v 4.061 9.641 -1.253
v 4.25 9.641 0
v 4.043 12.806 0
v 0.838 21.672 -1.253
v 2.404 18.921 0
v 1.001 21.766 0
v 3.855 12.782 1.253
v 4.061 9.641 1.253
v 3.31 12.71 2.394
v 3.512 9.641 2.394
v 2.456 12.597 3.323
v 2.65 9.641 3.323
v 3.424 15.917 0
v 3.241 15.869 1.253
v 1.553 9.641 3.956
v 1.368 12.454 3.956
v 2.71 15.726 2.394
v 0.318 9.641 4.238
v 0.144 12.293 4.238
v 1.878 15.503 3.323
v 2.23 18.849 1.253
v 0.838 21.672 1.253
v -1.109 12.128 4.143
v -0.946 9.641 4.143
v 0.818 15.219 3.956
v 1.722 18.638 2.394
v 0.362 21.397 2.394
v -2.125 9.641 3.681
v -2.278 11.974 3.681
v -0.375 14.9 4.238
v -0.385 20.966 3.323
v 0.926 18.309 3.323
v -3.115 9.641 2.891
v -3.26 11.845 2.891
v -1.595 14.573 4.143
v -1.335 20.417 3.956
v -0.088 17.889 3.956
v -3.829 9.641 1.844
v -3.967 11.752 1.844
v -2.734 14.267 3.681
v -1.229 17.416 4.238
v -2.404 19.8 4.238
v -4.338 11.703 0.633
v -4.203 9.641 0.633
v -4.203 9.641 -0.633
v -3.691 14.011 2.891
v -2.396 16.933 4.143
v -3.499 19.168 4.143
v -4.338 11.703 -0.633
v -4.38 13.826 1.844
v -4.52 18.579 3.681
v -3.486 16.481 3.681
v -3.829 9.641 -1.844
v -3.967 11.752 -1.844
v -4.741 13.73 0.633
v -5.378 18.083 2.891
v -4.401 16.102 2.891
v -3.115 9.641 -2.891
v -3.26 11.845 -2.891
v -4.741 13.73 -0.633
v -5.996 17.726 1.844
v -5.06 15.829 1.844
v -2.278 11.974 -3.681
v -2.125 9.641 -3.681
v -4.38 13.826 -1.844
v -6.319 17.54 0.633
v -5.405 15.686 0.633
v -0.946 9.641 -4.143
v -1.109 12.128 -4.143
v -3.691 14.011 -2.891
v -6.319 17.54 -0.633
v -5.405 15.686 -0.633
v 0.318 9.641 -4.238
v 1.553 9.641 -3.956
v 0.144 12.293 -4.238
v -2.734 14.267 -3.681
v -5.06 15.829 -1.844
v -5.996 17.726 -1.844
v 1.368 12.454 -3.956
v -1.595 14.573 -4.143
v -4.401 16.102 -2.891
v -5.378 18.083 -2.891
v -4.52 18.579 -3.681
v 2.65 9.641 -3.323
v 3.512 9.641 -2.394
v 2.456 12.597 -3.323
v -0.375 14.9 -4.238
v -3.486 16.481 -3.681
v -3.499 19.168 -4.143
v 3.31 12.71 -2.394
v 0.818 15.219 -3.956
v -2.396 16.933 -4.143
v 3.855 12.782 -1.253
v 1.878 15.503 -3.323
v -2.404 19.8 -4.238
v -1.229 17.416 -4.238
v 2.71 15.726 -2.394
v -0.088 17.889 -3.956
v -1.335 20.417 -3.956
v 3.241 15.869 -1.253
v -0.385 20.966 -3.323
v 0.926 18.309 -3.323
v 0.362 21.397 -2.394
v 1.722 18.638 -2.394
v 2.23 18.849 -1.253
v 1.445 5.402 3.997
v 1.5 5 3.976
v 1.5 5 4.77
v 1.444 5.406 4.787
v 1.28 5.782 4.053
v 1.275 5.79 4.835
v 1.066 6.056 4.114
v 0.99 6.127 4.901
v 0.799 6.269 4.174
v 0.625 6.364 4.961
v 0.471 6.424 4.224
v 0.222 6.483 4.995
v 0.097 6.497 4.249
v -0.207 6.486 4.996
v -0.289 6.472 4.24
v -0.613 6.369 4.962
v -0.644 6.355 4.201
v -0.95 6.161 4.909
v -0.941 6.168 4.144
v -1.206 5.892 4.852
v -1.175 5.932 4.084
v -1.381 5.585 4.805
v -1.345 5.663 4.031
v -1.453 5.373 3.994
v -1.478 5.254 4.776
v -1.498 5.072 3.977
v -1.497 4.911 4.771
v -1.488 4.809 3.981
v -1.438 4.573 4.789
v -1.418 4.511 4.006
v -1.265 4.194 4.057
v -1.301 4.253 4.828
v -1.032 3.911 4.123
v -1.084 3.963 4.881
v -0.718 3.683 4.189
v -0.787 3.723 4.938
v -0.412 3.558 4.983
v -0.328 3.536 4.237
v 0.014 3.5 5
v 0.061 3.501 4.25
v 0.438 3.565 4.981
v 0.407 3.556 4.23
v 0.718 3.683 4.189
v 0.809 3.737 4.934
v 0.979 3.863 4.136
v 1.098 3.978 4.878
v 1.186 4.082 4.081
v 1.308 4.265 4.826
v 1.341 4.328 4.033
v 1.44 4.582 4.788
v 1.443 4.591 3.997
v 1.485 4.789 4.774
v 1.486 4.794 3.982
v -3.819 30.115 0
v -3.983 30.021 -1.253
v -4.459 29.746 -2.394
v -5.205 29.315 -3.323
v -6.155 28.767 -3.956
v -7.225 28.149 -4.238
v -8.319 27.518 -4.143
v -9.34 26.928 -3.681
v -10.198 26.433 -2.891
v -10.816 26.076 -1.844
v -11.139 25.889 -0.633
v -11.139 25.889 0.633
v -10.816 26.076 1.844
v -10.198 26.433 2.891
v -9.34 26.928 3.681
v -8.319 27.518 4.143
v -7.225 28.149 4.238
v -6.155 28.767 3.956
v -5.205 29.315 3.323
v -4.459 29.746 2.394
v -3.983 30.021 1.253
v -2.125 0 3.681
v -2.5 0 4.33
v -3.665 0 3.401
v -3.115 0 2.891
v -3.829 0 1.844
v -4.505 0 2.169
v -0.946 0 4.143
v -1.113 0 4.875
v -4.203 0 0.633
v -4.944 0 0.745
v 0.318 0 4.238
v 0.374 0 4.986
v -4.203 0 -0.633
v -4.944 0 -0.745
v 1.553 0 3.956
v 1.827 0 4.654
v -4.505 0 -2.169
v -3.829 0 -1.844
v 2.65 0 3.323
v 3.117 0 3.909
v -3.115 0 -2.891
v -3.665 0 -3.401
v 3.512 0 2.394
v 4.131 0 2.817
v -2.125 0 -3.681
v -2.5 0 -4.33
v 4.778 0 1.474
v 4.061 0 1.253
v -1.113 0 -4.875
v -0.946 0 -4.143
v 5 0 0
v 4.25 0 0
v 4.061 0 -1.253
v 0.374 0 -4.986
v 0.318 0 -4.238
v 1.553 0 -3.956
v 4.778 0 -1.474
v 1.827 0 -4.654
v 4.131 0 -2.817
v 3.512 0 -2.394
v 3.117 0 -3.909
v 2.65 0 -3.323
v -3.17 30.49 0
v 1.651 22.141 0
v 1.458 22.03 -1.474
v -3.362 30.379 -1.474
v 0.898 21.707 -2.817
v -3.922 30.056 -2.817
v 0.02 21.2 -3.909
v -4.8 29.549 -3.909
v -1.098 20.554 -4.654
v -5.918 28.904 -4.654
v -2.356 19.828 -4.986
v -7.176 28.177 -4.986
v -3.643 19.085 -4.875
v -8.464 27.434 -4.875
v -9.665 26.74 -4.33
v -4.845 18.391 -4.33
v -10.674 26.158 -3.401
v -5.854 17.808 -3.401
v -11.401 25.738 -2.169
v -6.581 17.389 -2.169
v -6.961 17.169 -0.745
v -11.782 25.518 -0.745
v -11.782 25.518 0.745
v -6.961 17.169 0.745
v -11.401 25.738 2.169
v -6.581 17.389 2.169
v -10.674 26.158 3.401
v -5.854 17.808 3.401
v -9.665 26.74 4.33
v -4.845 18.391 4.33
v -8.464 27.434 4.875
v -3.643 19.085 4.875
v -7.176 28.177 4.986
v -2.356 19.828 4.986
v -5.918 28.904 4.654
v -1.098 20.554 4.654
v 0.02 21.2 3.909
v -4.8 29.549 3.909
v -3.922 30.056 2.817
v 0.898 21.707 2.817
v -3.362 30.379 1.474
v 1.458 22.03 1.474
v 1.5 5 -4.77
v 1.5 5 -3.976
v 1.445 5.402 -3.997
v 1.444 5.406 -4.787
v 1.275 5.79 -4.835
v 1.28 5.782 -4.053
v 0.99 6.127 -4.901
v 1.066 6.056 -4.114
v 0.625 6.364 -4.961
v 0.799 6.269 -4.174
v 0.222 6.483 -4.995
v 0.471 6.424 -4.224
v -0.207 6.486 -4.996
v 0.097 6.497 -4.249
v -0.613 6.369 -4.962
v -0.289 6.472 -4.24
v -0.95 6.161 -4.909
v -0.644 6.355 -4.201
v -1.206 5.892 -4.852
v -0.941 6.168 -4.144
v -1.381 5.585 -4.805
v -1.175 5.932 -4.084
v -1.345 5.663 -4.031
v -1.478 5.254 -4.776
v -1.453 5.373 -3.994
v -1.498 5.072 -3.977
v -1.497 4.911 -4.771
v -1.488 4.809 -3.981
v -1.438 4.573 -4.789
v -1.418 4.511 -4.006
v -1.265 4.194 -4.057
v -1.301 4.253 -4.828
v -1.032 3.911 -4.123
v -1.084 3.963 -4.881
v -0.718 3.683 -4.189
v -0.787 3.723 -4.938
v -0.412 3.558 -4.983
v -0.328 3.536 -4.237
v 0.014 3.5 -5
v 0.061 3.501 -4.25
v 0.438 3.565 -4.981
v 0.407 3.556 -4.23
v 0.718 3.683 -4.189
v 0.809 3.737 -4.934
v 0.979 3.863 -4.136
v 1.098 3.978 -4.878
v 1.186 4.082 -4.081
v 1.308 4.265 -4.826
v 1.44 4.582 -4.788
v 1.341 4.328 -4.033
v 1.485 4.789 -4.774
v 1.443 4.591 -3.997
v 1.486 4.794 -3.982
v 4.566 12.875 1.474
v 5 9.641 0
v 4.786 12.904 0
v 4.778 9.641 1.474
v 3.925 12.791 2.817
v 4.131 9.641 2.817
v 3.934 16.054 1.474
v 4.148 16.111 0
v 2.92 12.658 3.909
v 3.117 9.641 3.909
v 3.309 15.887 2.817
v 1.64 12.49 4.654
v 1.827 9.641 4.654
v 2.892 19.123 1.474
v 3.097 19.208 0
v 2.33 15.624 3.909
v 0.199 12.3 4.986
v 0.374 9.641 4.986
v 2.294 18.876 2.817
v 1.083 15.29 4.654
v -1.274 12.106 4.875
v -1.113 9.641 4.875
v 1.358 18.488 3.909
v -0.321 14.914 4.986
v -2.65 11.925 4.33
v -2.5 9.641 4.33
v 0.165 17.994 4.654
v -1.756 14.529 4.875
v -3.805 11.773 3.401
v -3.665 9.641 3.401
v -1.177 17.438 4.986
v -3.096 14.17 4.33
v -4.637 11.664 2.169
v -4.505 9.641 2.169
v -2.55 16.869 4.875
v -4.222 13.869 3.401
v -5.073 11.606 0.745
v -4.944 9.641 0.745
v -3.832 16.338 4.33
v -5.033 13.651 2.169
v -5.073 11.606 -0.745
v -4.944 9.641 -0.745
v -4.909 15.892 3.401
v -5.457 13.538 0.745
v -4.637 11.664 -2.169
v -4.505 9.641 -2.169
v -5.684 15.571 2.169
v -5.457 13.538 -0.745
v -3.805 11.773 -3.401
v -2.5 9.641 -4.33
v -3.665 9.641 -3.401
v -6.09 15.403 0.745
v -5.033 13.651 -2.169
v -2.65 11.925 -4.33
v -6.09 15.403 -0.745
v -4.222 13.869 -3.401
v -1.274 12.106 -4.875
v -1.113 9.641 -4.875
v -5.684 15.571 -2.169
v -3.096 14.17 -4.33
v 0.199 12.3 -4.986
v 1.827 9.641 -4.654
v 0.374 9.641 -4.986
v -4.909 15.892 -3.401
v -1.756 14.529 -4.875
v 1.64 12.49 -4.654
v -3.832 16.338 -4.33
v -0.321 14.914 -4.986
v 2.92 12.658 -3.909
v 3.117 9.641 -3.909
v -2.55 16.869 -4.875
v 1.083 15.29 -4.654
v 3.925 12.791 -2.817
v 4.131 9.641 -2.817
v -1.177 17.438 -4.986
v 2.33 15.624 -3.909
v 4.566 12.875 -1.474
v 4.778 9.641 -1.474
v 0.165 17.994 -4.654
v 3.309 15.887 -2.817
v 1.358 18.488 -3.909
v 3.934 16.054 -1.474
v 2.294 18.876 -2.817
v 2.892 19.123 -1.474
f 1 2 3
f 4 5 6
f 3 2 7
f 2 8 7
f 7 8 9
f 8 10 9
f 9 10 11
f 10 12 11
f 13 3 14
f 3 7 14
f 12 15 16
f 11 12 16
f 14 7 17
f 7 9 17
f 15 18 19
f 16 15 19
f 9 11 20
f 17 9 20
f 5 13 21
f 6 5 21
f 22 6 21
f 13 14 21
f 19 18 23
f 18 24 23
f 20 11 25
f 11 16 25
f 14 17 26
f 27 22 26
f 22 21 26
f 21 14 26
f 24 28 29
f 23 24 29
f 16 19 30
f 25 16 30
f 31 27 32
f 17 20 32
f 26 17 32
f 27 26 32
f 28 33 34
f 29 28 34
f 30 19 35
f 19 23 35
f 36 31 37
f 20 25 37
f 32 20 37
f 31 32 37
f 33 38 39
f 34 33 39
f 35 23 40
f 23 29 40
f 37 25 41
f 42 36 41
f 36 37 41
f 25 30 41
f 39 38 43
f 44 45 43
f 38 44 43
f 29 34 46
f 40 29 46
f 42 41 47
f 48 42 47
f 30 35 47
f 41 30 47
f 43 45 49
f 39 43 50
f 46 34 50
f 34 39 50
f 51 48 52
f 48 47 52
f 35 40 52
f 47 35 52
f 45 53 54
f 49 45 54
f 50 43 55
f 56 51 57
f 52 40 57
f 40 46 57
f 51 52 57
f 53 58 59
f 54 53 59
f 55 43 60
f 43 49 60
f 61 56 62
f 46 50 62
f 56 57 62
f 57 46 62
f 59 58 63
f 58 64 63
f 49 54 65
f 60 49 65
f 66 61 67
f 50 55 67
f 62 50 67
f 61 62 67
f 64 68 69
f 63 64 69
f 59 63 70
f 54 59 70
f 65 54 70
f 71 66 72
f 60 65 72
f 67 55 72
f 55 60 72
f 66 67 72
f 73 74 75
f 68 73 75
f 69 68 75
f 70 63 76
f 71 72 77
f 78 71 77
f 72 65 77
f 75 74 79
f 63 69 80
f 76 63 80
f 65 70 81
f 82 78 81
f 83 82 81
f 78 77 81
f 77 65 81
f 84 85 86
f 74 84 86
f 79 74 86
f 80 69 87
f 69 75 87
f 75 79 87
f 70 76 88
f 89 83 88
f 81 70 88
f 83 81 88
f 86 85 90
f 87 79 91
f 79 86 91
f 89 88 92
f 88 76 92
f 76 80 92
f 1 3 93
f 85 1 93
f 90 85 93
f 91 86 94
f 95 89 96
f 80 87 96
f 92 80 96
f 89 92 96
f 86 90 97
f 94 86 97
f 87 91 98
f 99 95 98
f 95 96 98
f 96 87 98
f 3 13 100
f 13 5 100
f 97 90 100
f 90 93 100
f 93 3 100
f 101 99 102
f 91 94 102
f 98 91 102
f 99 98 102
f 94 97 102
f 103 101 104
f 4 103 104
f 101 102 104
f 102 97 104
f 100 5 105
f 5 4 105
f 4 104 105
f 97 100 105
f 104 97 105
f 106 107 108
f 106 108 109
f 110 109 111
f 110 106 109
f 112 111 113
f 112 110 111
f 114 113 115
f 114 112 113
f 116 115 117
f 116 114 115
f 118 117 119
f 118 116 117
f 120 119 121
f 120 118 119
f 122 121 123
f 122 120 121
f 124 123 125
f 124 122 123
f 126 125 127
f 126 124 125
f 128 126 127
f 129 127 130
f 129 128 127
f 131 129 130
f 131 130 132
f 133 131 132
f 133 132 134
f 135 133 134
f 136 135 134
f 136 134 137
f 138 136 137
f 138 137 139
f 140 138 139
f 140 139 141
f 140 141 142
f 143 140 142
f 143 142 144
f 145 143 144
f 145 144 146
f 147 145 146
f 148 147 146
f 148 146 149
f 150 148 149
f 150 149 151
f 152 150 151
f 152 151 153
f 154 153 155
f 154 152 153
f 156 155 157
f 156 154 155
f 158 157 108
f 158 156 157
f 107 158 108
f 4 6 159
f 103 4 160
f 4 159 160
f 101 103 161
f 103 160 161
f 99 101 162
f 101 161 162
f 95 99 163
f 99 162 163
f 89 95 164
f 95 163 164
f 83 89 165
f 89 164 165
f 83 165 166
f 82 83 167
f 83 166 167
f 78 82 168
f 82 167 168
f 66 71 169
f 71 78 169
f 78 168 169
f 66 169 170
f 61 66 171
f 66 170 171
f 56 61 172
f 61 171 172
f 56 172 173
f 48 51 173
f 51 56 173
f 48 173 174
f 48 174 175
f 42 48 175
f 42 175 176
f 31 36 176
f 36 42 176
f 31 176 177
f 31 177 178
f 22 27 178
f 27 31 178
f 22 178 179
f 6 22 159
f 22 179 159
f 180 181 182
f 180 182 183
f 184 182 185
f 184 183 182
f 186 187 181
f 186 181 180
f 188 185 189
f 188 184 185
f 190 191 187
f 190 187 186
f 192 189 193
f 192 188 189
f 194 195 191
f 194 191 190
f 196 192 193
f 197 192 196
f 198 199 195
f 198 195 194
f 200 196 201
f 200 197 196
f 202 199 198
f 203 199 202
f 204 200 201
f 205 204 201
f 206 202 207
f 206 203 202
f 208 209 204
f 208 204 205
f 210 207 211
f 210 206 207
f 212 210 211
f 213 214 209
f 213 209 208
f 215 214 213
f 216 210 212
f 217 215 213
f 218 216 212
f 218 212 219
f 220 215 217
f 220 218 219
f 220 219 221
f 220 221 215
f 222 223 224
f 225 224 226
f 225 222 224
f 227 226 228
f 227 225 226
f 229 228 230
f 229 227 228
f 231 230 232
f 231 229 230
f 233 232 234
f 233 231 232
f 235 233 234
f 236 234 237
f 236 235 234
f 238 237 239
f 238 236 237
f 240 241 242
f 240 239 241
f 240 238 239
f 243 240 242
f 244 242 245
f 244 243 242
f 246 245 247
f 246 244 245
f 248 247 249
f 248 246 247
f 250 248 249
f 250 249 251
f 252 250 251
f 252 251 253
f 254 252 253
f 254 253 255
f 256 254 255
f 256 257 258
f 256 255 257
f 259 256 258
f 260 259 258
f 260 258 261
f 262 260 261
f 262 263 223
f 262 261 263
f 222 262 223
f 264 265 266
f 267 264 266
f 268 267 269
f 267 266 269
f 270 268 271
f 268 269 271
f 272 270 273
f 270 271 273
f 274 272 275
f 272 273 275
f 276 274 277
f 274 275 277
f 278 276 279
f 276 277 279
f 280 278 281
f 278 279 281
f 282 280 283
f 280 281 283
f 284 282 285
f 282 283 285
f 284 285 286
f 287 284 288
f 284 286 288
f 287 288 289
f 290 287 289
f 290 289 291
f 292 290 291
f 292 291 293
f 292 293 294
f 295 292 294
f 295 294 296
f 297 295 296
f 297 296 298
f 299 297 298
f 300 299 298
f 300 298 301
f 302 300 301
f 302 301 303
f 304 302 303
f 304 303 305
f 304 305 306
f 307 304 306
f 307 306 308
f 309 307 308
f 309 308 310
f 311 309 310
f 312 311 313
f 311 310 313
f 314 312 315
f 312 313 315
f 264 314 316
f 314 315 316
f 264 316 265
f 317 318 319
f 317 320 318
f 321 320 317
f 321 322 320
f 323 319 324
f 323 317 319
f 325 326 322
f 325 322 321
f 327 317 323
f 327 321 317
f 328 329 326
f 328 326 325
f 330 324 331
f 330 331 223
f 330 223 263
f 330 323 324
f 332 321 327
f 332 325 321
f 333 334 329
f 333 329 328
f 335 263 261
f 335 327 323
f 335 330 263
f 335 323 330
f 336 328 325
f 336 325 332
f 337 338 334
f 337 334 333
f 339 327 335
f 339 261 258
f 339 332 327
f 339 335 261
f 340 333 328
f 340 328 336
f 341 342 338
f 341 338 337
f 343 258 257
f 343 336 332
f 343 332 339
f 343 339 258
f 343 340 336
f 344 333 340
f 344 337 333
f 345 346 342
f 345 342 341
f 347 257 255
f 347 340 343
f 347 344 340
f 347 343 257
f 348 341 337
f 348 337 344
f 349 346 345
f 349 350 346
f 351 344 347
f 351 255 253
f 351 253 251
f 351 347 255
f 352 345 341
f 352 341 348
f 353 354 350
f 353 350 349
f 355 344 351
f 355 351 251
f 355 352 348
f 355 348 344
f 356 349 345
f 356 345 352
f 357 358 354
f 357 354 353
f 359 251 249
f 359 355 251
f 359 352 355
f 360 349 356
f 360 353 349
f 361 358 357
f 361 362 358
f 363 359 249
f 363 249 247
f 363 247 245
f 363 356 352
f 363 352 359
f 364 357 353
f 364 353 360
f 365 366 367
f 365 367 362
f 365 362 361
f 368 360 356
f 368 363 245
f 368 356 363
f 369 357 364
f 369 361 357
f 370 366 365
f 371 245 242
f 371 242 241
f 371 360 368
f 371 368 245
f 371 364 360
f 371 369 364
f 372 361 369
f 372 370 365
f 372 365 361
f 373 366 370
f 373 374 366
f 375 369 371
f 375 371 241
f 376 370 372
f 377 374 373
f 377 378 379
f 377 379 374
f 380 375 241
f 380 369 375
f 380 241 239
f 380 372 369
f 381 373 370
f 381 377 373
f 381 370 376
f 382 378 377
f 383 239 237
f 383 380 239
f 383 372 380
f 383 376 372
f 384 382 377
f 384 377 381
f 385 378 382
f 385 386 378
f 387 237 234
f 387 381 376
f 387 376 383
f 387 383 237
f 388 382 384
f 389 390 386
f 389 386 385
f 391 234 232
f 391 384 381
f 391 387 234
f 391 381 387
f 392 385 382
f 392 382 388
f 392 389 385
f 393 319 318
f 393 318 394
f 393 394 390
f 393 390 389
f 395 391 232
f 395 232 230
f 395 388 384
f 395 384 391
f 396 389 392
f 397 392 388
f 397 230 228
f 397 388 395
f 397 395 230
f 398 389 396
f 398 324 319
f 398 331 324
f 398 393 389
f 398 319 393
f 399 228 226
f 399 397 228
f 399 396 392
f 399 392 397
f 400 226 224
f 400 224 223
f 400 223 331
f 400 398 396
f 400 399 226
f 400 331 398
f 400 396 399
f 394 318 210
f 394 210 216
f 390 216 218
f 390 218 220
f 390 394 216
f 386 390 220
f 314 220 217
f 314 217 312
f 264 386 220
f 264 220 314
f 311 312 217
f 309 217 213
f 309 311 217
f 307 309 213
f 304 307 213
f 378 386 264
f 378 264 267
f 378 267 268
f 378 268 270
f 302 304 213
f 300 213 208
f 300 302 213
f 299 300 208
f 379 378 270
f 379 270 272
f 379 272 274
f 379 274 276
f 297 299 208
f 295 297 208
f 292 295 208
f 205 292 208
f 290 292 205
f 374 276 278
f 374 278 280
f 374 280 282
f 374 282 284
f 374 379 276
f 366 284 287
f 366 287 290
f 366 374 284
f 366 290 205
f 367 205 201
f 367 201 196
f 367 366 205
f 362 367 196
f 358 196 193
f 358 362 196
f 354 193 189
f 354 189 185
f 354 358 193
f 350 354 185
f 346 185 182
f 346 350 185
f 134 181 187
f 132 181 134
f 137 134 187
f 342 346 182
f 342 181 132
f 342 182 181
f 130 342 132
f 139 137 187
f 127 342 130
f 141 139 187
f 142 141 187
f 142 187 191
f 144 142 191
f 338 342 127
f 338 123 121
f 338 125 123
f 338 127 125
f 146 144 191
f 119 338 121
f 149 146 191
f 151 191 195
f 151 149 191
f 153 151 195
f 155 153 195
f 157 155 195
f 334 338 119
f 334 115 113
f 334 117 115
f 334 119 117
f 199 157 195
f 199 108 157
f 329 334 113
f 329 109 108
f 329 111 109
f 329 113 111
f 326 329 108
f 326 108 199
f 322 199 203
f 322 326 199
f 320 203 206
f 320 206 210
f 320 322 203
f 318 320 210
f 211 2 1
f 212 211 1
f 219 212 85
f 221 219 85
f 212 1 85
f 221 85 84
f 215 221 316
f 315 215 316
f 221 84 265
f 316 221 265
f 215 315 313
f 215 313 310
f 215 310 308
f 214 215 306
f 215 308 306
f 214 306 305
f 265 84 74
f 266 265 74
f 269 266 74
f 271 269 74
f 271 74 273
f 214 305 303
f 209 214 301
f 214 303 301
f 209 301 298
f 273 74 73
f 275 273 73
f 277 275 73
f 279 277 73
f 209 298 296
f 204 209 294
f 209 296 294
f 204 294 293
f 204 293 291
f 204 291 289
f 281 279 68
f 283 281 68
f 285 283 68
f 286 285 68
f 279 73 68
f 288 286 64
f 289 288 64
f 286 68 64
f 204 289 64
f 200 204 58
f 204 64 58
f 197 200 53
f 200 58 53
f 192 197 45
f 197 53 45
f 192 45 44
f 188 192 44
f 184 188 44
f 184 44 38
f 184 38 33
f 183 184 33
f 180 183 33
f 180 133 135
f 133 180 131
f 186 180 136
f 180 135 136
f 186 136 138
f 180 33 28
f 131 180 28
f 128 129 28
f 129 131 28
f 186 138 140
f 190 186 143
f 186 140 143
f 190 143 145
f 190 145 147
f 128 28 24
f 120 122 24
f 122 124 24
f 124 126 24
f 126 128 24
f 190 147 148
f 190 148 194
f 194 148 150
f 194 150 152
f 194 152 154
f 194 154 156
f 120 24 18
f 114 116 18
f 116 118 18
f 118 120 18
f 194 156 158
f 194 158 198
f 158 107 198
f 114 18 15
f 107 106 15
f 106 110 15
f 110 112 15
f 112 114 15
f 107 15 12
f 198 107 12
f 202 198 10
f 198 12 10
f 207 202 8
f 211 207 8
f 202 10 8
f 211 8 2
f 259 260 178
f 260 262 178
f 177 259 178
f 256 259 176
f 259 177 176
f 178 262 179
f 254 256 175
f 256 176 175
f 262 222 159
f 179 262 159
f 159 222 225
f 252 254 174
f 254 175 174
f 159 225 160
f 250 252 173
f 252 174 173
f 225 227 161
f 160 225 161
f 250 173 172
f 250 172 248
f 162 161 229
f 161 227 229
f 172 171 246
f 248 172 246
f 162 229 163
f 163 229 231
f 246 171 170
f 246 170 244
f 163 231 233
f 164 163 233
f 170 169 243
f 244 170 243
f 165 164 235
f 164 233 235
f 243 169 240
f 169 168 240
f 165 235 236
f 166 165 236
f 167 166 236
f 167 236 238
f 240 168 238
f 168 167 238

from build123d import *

# Parameters (mm, degrees)
F1_R          = 5
F1_R_2        = 4.25
F3_R          = 1.5
F4_DEPTH      = 25
F4_DEPTH_BACK = 25


with BuildPart() as f2:
    # F2: sweep along a path in F0
    with BuildLine(Plane.XY) as f2_path:
        Line((0, 0), (0, 9.6410161514))
        ThreePointArc((0, 9.6410161514), (-0.6814834742, 14.8173970534), (-2.6794919243, 19.6410161514))
        Line((-2.6794919243, 19.6410161514), (-7.5, 27.9903810568))
    # F1 (on Front) → F2 (sweep)
    with BuildSketch(Plane.XZ):
        Circle(F1_R)
        Circle(F1_R_2, mode=Mode.SUBTRACT)
    sweep(path=f2_path.line)

    # F3 (on Top) → F4 (cut, two sides)
    with BuildSketch(Plane.XY) as f4_sk:
        with Locations((0, 5)):
            Circle(F3_R)
    extrude(amount=-F4_DEPTH, mode=Mode.SUBTRACT)
    extrude(f4_sk.sketch, amount=F4_DEPTH_BACK, mode=Mode.SUBTRACT)


solid = f2.part
